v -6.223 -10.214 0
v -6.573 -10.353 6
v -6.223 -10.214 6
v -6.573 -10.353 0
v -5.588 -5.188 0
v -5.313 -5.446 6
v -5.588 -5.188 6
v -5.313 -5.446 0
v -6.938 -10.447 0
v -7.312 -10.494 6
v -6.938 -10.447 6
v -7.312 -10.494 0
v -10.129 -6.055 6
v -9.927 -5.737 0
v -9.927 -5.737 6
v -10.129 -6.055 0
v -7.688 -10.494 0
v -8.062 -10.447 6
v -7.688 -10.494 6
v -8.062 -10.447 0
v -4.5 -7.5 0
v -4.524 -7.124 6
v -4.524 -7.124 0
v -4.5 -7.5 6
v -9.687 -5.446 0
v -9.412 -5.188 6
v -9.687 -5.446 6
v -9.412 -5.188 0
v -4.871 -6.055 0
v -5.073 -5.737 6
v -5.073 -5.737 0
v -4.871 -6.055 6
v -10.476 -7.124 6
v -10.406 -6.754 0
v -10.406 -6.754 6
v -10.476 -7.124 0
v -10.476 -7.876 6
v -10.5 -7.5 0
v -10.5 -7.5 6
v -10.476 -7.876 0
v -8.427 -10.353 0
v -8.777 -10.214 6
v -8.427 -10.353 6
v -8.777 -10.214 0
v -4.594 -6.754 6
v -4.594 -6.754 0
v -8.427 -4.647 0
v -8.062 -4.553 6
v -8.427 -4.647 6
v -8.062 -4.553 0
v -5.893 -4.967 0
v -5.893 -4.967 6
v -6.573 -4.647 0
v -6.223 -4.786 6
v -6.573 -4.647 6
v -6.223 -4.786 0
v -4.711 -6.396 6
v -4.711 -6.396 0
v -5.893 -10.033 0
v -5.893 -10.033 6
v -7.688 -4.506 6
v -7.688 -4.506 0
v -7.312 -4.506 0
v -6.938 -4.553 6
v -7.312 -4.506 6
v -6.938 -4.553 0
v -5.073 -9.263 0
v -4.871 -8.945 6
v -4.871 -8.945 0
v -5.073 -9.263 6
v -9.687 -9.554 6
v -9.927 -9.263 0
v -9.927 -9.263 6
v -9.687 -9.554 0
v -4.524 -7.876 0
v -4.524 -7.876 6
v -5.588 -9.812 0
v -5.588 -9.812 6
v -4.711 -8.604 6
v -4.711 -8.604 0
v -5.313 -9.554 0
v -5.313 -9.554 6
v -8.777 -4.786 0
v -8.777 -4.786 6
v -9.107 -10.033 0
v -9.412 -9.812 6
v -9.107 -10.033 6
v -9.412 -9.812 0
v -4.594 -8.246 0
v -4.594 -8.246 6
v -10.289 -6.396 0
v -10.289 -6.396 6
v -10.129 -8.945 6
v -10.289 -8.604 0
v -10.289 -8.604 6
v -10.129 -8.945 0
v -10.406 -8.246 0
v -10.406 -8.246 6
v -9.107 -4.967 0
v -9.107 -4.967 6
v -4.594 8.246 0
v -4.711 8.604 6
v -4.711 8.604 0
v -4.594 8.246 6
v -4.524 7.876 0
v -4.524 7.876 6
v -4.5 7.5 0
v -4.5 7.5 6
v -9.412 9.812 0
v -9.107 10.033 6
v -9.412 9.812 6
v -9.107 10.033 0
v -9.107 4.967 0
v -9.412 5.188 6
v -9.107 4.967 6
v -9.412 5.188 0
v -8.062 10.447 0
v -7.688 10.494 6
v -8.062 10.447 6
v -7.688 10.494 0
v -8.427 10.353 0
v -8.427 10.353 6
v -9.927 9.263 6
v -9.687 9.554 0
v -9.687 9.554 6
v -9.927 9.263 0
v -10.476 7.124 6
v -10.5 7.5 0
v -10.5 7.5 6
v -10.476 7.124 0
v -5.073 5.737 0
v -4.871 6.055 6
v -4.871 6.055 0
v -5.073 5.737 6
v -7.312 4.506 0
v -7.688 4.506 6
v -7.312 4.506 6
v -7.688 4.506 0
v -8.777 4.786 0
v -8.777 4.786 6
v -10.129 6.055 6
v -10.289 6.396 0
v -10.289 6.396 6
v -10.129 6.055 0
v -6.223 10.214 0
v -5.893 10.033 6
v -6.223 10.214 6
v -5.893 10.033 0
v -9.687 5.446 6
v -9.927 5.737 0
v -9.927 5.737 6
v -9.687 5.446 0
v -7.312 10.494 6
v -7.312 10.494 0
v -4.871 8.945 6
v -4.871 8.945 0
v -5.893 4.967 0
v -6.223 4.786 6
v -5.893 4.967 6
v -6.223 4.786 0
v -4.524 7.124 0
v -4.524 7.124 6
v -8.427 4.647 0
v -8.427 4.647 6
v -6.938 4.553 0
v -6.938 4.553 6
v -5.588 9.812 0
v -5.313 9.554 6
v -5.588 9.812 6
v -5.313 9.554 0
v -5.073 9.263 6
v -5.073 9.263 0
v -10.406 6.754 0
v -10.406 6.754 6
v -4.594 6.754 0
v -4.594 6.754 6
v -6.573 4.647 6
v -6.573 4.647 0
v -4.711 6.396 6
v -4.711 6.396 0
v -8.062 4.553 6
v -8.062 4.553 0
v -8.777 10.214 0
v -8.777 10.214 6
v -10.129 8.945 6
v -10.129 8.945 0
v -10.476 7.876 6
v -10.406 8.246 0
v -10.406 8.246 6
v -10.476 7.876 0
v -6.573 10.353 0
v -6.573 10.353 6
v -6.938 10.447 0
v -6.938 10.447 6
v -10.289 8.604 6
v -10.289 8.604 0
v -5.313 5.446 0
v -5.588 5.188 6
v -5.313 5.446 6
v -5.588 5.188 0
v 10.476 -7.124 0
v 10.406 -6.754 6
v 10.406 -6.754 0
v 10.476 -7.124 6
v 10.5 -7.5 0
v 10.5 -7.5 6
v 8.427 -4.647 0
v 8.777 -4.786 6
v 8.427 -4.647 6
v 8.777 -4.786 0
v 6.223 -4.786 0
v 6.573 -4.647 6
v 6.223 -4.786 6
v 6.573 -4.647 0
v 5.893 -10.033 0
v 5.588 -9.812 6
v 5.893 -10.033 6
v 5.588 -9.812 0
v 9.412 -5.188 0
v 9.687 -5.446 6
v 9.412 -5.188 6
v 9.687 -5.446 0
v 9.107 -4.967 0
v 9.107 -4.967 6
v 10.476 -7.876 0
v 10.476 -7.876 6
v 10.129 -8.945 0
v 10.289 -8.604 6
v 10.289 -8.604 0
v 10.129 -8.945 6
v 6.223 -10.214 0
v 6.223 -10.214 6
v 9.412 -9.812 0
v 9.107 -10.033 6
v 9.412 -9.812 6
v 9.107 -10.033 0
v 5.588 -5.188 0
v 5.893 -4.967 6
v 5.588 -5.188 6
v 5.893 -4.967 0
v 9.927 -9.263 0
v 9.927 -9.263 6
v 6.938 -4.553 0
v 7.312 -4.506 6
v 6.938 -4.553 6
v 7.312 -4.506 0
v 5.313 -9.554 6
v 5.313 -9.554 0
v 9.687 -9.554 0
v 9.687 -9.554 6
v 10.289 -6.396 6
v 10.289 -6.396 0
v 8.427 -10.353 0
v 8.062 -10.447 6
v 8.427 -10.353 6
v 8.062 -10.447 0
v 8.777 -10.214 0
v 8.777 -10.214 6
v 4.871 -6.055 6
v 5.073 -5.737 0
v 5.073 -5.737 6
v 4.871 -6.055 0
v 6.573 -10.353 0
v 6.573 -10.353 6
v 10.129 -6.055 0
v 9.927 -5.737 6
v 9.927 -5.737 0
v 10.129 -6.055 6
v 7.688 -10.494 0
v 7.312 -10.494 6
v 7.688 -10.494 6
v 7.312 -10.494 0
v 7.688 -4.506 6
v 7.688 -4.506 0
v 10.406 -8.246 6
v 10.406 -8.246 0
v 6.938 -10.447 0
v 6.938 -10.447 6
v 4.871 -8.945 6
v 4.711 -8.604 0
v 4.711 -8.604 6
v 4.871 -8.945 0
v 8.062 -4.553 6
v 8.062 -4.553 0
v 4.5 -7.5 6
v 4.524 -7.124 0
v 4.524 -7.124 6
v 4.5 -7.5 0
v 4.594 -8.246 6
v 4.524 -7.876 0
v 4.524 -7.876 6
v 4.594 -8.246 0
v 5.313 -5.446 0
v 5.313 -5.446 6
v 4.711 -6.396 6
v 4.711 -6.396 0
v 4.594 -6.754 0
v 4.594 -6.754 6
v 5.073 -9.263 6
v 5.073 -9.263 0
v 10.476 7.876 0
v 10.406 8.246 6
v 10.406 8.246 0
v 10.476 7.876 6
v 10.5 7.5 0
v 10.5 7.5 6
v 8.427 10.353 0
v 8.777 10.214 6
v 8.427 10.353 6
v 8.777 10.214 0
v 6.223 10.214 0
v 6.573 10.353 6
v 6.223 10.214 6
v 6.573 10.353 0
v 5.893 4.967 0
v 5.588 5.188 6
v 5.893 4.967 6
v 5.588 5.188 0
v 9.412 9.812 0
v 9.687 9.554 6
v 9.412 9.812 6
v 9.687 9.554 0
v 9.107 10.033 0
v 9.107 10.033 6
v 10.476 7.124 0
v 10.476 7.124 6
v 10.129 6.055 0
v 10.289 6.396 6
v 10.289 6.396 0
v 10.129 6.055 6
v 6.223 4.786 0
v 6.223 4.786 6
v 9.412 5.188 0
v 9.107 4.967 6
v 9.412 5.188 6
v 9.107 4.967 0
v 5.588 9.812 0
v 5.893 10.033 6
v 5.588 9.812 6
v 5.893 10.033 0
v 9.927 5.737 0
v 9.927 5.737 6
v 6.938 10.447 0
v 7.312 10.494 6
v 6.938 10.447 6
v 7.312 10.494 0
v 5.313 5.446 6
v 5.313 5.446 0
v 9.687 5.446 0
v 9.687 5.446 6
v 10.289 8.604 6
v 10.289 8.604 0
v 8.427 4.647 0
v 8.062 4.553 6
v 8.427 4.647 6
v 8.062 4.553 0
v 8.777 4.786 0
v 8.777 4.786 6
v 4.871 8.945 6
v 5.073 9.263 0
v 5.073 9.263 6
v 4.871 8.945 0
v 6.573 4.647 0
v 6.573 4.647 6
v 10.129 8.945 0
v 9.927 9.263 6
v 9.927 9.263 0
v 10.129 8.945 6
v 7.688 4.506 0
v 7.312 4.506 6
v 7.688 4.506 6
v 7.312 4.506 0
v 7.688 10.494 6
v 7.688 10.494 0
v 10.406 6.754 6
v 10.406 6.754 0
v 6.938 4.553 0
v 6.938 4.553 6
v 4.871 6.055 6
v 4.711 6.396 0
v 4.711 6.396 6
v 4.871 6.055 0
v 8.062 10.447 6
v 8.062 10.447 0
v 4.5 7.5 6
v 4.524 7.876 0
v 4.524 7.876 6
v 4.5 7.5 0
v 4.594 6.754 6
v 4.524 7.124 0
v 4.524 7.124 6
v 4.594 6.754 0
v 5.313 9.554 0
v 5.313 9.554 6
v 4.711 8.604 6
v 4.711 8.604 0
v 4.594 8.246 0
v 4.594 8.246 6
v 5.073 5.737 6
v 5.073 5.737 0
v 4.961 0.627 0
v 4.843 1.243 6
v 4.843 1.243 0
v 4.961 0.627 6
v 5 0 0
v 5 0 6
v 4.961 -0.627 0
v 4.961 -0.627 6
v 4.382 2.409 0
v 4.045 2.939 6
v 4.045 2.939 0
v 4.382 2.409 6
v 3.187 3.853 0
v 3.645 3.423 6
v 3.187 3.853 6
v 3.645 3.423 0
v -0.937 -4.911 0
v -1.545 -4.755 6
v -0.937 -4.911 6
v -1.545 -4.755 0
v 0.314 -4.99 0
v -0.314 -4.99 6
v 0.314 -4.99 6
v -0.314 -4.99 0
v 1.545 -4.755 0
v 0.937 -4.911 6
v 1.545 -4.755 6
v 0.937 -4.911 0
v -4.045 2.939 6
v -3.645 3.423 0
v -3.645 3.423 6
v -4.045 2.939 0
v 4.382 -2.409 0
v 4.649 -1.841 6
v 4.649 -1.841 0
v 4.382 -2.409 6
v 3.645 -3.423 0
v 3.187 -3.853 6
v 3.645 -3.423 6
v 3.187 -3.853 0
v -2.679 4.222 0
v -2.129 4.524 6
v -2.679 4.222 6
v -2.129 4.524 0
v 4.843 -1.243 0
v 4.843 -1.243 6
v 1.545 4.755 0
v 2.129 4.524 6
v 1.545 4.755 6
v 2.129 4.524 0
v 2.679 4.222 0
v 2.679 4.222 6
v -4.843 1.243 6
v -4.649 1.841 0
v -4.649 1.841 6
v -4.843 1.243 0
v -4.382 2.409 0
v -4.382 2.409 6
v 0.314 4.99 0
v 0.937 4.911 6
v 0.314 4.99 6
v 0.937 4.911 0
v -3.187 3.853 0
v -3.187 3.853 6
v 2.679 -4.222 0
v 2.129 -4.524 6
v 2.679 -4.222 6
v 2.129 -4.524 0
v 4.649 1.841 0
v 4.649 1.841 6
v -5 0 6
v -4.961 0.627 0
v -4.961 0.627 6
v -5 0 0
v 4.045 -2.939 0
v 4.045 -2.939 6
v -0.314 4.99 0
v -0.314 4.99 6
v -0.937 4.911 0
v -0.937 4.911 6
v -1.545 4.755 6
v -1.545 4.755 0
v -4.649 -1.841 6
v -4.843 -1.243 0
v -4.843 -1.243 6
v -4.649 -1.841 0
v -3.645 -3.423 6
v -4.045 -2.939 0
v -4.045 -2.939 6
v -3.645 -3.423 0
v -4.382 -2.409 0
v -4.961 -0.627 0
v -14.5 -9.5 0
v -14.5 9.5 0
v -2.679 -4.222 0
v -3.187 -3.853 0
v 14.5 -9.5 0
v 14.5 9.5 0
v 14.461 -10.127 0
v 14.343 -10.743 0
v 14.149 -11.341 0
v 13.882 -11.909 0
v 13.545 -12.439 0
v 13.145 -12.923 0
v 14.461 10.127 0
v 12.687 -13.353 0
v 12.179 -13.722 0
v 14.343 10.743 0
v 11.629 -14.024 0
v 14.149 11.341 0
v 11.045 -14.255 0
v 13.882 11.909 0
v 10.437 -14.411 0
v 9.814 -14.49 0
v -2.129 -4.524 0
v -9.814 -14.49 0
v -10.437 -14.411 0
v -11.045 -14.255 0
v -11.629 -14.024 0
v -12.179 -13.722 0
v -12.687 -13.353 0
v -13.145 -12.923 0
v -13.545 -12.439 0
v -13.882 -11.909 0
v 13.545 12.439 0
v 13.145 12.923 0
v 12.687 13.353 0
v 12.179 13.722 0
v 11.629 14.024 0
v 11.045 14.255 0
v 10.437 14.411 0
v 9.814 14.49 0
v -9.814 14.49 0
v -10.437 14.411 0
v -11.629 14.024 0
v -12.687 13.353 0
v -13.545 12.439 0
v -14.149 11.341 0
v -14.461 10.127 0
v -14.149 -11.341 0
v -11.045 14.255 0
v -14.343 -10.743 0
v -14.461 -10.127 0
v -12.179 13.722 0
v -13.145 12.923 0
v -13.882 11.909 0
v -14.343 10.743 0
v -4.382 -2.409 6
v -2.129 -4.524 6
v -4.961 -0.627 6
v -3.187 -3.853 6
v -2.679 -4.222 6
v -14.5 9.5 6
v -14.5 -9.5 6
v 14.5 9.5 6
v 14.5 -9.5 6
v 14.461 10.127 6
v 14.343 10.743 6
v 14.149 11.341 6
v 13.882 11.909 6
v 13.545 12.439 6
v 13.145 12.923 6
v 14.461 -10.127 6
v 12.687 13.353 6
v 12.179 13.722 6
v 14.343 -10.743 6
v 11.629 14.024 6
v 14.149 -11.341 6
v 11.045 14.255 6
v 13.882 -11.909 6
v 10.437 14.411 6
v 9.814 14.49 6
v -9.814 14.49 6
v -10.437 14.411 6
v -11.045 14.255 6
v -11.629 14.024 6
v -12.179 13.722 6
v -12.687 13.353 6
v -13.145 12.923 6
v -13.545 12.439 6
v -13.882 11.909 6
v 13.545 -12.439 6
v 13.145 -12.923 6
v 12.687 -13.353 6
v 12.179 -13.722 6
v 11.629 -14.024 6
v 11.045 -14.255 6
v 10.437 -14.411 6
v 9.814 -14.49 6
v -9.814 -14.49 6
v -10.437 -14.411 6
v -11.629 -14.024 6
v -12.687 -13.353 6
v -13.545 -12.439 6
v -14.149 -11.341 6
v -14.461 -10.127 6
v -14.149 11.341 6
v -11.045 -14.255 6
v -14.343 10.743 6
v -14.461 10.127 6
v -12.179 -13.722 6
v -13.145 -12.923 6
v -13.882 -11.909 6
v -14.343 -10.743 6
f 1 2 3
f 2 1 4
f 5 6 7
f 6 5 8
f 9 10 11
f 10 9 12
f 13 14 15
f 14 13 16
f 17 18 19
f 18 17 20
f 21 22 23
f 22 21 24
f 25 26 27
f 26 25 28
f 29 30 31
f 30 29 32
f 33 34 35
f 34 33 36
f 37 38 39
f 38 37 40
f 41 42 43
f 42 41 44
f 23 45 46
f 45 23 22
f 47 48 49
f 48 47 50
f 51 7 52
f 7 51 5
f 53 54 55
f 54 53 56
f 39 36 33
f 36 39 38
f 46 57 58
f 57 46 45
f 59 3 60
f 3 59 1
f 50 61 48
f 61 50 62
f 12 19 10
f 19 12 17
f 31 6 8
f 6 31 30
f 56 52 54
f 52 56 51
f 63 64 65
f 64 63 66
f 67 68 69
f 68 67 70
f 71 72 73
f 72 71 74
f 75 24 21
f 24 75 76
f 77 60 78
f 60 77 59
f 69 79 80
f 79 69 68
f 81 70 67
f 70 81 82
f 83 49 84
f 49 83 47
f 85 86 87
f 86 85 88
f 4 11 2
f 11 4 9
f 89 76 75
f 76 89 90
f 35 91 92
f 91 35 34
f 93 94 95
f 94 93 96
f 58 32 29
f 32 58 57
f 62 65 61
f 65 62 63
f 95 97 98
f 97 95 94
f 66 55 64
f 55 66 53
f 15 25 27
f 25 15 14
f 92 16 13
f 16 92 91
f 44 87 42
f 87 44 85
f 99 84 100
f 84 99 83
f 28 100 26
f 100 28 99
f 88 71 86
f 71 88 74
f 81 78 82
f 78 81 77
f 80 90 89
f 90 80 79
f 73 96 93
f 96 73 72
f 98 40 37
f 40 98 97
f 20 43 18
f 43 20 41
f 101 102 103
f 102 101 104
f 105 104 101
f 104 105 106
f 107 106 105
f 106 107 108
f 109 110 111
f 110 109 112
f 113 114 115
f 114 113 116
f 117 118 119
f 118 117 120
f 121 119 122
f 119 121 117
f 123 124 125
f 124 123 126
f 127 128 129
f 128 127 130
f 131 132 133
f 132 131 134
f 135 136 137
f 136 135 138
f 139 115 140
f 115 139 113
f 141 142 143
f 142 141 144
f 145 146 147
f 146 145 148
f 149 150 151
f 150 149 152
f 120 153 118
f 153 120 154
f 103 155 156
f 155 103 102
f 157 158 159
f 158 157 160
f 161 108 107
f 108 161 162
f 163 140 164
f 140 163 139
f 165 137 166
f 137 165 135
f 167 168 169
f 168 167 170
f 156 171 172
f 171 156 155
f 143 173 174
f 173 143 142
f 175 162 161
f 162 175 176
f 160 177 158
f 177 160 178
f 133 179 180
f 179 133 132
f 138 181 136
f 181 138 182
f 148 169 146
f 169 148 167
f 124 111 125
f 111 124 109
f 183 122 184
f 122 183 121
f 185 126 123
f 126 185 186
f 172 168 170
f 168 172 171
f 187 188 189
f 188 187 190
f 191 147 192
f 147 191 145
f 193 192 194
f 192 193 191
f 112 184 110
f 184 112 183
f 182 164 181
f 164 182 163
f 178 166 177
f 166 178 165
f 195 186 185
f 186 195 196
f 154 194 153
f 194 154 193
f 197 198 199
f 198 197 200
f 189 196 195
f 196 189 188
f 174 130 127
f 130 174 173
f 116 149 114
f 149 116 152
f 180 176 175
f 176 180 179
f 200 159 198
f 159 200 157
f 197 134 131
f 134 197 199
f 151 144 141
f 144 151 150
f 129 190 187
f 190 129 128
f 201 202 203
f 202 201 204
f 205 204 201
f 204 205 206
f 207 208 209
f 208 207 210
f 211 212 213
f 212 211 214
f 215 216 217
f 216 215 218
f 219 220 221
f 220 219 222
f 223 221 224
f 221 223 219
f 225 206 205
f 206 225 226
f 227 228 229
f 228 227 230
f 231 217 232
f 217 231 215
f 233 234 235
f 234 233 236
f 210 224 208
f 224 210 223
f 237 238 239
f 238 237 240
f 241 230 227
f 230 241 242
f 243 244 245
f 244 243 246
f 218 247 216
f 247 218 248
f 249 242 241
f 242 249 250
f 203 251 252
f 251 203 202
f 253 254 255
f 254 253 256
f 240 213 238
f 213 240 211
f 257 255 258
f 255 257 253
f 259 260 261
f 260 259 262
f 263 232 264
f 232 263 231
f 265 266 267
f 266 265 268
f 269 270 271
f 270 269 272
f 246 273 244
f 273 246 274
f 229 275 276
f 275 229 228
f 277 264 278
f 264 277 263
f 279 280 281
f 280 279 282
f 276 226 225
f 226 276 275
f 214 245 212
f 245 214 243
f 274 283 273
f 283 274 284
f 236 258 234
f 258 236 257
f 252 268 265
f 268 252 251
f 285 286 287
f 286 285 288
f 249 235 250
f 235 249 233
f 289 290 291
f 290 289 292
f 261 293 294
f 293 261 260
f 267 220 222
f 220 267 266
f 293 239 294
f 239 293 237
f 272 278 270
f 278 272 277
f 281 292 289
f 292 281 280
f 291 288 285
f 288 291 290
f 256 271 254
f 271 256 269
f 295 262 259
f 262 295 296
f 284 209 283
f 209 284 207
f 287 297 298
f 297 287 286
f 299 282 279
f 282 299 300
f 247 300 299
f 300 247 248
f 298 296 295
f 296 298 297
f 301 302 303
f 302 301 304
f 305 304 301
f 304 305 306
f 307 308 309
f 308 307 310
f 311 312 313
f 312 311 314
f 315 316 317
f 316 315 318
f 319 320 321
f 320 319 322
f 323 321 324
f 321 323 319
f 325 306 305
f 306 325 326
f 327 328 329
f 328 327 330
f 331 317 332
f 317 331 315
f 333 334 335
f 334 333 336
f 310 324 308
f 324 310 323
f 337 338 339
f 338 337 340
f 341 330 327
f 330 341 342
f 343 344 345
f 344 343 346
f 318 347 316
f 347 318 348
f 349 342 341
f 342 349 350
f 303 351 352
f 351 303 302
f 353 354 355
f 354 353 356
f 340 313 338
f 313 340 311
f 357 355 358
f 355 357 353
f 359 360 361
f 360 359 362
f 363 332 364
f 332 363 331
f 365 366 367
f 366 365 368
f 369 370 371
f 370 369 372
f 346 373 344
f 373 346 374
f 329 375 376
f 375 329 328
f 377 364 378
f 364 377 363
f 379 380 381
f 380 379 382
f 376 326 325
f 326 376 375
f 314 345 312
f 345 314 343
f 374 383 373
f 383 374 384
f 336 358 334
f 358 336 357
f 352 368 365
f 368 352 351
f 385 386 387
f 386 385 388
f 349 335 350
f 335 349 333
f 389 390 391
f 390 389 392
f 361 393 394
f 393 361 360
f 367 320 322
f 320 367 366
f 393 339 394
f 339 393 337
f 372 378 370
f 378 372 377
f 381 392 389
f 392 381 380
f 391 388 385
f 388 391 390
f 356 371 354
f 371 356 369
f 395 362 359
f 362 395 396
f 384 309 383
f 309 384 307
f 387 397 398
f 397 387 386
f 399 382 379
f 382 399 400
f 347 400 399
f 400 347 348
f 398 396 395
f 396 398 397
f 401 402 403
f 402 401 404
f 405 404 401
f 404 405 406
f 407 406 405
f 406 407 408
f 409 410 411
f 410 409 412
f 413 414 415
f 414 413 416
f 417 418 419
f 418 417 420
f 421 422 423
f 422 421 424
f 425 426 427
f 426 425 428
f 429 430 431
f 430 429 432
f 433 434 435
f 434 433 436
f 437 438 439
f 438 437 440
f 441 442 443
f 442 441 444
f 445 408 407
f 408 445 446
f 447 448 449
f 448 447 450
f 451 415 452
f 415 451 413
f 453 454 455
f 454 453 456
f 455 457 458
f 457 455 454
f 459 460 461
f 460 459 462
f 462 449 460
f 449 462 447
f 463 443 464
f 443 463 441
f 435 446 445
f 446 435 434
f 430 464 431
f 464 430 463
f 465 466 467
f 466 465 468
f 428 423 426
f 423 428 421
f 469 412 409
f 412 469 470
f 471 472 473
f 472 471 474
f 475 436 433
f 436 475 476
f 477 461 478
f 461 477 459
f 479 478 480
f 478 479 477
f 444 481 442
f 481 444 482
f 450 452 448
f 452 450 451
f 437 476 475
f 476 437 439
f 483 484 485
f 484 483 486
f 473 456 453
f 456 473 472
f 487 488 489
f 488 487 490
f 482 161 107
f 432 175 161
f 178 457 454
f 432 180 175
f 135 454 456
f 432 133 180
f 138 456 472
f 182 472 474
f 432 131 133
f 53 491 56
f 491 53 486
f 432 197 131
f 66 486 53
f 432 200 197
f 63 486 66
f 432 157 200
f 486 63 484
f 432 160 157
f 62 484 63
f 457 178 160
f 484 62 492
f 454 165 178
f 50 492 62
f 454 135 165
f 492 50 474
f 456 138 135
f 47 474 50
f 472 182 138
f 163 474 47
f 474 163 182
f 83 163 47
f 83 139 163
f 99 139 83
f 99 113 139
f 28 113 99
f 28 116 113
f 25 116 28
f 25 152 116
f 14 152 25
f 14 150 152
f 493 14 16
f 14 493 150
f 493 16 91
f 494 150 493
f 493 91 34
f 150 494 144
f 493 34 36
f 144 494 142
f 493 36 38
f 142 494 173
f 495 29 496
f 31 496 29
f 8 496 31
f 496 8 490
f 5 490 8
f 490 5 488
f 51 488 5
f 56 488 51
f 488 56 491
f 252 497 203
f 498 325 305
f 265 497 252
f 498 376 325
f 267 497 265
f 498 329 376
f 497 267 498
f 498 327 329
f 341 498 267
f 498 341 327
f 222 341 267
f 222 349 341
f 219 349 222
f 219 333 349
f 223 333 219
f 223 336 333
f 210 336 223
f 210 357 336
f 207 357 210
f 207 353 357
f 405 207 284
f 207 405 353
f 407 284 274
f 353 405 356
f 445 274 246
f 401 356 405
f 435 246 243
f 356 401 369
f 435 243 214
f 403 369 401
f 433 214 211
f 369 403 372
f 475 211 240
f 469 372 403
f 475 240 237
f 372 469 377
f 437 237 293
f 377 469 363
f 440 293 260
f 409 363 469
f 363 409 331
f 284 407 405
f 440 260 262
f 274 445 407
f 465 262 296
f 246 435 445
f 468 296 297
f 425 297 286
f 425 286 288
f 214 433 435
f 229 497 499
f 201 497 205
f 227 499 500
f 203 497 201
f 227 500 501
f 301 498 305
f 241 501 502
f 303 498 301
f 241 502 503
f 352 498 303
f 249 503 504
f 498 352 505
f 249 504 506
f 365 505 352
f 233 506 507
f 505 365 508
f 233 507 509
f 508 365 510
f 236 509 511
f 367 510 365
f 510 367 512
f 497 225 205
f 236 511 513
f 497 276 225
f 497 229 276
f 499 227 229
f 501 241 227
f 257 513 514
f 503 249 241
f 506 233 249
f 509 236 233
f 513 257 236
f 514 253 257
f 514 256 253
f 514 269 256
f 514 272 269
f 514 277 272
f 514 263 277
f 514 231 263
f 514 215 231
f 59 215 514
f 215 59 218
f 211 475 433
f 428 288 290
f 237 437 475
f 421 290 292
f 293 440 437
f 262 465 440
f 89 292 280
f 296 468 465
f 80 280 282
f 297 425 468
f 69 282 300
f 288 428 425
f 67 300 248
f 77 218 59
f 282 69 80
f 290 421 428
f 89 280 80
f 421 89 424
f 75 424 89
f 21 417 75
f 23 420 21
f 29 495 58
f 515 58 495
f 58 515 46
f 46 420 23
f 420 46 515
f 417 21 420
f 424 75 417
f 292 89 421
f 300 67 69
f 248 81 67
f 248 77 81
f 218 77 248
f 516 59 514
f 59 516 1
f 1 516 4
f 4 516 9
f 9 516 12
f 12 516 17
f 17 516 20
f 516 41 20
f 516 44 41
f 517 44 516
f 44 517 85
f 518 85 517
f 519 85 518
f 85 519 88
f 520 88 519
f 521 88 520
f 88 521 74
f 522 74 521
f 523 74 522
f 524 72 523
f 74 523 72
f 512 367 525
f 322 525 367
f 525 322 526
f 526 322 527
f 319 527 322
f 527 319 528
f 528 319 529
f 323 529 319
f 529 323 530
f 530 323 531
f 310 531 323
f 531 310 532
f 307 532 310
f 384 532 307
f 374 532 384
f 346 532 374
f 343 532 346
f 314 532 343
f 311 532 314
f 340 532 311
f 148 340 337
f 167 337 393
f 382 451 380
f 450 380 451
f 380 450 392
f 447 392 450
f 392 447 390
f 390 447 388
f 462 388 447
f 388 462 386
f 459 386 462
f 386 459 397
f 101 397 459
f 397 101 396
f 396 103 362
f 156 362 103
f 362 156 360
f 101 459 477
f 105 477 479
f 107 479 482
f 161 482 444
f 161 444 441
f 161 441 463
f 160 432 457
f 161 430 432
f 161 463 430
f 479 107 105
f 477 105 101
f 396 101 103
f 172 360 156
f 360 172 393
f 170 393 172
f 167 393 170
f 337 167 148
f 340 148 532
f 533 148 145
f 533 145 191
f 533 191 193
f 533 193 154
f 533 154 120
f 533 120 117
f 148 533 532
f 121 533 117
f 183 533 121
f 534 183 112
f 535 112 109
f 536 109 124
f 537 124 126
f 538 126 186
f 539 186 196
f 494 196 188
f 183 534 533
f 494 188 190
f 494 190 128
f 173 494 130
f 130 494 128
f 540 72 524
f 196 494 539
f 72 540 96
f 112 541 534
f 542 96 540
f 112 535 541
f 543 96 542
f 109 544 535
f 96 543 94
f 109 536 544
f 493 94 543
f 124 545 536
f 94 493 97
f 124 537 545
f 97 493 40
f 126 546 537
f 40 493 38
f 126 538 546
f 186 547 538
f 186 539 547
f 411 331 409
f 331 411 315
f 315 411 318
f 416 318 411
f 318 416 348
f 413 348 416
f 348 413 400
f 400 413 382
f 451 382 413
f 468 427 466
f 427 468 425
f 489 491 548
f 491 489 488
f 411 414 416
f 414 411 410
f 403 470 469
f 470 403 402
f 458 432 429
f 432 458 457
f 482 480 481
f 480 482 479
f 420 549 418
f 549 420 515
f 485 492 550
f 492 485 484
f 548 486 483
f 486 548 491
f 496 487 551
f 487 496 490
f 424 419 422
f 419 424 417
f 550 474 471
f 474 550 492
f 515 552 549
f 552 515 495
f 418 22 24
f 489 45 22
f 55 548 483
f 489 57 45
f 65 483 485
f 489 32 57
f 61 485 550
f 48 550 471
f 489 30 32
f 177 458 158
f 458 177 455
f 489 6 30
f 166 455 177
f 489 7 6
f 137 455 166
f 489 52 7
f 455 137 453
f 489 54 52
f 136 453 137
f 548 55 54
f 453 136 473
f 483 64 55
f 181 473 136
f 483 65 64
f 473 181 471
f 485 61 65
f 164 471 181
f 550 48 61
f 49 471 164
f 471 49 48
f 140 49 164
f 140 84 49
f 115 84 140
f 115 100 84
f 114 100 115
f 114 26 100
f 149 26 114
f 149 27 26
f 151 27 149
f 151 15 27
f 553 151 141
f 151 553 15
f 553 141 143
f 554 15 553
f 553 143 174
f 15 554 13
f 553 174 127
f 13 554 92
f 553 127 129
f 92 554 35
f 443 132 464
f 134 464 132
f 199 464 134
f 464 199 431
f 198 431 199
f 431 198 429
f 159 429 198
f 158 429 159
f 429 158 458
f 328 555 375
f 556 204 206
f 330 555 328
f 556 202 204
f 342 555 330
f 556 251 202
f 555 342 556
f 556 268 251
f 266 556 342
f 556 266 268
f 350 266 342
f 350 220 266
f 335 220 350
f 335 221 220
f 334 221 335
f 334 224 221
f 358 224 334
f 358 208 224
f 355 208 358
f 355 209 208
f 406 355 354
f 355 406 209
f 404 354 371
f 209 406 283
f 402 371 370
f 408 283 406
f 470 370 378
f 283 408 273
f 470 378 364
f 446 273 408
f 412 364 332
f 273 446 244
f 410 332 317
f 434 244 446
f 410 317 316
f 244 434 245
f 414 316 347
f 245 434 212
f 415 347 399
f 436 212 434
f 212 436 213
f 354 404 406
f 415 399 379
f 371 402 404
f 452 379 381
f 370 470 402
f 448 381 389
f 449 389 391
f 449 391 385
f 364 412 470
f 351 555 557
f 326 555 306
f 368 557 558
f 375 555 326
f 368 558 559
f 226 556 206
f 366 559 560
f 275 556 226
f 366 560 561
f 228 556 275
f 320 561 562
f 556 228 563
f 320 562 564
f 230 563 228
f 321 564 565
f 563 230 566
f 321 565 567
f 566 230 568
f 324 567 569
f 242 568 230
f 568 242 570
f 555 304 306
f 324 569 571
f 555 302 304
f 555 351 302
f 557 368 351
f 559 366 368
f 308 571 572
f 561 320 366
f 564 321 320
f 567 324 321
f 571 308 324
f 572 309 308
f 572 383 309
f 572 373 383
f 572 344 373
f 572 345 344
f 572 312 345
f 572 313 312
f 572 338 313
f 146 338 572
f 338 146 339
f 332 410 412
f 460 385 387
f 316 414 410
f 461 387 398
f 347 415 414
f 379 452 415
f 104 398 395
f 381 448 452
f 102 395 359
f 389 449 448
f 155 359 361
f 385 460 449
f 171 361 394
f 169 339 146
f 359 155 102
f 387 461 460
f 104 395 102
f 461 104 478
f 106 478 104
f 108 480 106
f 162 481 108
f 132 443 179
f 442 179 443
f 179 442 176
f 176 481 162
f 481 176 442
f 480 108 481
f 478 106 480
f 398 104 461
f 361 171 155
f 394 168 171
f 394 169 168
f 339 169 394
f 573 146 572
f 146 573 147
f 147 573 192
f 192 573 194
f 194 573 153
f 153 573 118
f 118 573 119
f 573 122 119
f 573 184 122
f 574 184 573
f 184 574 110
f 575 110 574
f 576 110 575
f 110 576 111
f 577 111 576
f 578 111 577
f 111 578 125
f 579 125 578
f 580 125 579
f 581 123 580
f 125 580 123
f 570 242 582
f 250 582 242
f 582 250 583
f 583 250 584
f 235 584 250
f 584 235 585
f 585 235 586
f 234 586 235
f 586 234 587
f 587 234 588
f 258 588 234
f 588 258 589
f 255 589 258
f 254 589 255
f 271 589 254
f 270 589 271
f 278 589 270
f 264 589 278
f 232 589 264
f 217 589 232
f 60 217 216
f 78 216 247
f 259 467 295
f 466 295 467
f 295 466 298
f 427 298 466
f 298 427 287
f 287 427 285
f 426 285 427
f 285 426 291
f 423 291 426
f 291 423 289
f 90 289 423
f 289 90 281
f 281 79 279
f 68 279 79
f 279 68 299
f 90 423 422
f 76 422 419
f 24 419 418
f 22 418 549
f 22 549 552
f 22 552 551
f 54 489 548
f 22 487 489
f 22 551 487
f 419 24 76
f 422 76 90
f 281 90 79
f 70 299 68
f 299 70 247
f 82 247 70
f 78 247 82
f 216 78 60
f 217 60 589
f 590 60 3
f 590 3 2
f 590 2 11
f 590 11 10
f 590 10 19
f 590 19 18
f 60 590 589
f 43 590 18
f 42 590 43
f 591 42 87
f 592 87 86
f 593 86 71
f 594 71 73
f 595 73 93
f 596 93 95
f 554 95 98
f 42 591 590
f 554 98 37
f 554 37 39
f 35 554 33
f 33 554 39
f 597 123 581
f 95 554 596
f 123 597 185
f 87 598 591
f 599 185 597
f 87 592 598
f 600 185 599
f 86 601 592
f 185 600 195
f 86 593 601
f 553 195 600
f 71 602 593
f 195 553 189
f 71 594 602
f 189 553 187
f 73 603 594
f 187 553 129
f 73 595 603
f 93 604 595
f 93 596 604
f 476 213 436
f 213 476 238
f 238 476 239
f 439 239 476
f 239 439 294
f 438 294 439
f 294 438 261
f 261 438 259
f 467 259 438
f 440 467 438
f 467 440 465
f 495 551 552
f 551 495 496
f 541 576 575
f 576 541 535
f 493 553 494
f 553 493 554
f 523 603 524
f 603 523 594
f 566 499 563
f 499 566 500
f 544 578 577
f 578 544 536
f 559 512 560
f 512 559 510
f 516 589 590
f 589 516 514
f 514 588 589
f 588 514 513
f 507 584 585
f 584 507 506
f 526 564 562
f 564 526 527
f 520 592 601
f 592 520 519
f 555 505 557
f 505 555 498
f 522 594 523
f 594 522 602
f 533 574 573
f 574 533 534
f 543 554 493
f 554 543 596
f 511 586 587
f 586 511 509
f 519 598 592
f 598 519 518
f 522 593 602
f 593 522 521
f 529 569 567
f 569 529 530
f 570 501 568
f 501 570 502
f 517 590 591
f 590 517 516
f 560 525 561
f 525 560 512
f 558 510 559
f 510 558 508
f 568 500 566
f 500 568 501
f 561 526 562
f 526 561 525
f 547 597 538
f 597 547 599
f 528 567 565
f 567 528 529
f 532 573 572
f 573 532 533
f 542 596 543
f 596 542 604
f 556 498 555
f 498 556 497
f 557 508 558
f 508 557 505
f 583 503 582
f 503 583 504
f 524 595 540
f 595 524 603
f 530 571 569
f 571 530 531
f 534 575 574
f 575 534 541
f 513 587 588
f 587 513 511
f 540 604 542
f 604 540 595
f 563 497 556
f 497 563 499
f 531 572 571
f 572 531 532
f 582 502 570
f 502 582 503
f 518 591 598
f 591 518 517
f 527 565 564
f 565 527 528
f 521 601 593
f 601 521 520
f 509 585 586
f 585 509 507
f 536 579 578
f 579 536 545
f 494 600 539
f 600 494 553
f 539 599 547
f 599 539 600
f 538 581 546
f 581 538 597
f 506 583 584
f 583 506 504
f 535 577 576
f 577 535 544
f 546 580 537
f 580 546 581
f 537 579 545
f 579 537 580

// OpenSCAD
$fn = 50;


difference() {
	union() {
		hull() {
			translate(v = [-9.5000000000, 9.5000000000, 0]) {
				cylinder(h = 6, r = 5);
			}
			translate(v = [9.5000000000, 9.5000000000, 0]) {
				cylinder(h = 6, r = 5);
			}
			translate(v = [-9.5000000000, -9.5000000000, 0]) {
				cylinder(h = 6, r = 5);
			}
			translate(v = [9.5000000000, -9.5000000000, 0]) {
				cylinder(h = 6, r = 5);
			}
		}
	}
	union() {
		#translate(v = [-7.5000000000, -7.5000000000, -100.0000000000]) {
			cylinder(h = 200, r = 3.0000000000);
		}
		#translate(v = [-7.5000000000, 7.5000000000, -100.0000000000]) {
			cylinder(h = 200, r = 3.0000000000);
		}
		#translate(v = [7.5000000000, -7.5000000000, -100.0000000000]) {
			cylinder(h = 200, r = 3.0000000000);
		}
		#translate(v = [7.5000000000, 7.5000000000, -100.0000000000]) {
			cylinder(h = 200, r = 3.0000000000);
		}
		#cylinder(h = 6, r = 5.0000000000);
	}
}
